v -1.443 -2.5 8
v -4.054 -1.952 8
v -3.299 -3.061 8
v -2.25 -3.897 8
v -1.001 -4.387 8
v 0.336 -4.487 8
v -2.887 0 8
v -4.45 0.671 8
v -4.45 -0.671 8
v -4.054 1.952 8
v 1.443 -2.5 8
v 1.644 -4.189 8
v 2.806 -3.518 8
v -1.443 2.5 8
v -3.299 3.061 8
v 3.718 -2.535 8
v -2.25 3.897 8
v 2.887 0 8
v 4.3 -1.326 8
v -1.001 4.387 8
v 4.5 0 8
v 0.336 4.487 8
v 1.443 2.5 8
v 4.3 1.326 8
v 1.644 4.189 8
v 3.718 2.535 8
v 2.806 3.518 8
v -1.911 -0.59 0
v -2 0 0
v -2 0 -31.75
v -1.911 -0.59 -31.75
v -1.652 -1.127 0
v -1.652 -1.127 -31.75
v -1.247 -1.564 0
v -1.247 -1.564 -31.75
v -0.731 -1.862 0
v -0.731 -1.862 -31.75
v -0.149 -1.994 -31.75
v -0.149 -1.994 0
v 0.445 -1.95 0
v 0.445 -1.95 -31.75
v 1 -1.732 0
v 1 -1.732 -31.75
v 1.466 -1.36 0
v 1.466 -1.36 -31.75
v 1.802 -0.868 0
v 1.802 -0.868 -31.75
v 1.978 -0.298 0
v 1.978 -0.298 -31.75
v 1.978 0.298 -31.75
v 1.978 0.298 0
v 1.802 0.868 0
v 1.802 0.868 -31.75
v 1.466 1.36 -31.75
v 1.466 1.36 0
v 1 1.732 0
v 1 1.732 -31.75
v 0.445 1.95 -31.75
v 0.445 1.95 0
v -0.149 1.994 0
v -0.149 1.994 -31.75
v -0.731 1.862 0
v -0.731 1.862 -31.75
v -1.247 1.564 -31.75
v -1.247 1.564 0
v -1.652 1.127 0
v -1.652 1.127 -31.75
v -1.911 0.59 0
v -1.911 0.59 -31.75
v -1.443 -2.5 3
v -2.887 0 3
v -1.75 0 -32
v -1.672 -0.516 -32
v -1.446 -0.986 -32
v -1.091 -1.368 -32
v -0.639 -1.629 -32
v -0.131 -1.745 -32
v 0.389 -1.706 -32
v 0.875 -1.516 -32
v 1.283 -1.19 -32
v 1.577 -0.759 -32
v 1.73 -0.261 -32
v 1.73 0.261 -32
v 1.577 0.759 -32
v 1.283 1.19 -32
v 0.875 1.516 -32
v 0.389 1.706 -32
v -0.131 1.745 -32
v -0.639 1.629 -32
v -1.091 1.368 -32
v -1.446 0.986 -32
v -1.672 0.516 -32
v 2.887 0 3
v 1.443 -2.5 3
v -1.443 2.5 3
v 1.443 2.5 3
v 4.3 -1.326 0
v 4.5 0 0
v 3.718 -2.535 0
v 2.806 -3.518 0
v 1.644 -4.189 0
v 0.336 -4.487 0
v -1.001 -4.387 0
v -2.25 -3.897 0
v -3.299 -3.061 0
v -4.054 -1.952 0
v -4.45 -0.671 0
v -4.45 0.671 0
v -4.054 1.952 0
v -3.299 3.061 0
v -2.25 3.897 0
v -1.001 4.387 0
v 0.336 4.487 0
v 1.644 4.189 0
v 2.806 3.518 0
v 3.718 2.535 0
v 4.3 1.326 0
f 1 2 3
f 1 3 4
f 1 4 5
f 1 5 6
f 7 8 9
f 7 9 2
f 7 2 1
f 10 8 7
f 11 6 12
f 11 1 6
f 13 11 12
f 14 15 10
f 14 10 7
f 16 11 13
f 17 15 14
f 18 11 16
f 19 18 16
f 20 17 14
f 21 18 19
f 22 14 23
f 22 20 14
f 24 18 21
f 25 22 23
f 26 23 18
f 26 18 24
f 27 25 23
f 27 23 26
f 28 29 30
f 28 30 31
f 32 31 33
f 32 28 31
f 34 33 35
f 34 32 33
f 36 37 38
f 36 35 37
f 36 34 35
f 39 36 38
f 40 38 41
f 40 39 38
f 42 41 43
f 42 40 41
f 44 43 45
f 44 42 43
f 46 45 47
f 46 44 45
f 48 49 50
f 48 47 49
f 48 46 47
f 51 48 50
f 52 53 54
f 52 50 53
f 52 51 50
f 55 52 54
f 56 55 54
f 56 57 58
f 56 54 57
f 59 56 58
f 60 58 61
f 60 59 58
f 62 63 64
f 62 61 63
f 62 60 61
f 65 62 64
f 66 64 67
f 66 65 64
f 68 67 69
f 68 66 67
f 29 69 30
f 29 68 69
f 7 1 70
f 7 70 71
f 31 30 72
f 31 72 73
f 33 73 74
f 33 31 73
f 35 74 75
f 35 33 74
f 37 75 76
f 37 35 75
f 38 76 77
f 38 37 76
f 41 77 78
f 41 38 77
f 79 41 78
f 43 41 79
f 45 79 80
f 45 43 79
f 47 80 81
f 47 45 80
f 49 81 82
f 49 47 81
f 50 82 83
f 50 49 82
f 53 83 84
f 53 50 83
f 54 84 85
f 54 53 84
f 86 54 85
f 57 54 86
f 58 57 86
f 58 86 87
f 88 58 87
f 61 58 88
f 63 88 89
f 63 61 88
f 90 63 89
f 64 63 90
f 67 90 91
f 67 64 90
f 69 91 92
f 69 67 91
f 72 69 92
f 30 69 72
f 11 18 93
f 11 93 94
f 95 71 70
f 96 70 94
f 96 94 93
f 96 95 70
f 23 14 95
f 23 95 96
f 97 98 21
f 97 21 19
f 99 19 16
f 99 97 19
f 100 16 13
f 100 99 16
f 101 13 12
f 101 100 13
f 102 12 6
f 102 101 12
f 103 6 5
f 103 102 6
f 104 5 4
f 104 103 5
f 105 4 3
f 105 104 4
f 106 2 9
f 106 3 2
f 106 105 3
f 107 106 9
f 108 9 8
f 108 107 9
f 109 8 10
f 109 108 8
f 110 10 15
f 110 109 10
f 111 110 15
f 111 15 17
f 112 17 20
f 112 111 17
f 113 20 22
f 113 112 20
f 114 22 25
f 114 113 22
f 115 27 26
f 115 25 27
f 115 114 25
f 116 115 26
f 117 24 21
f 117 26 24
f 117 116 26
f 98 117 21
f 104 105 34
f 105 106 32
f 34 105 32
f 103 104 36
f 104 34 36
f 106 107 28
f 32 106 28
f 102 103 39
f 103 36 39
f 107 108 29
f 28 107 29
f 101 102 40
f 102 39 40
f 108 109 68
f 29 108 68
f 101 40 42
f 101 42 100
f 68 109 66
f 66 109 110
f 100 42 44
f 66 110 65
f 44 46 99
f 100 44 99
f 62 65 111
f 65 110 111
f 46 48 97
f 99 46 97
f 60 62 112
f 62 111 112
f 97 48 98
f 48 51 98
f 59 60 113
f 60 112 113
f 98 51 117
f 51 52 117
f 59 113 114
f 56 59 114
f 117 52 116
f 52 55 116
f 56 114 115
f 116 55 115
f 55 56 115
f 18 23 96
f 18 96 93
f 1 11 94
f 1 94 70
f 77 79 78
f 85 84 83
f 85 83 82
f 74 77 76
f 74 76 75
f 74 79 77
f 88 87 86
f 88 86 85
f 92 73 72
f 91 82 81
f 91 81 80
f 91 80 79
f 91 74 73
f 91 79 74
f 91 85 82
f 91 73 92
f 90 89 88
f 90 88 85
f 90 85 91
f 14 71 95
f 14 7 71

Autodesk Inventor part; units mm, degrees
ref_plane "YZ Plane" through (0, 0, 0) normal (1, 0, 0) x (0, 1, 0)
ref_plane "XZ Plane" through (0, 0, 0) normal (0, 1, 0) x (-1, 0, 0)
ref_plane "XY Plane" through (0, 0, 0) normal (0, 0, 1) x (1, 0, 0)
sketch "草图1" plane through (0, 0, 0) normal (0, 0, 1) x (1, 0, 0)
  circle A0 centre (0, 0) radius 4.5
  dimension "d0" = 9
extrude "拉伸1" add sketch "草图1" along normal blind 8
sketch "草图2" plane through (0, 0, 0) normal (0, 0, -1) x (-1, 0, 0)
  circle A0 centre (0, 0) radius 2
  dimension "d3" = 4
extrude "拉伸2" add sketch "草图2" along normal blind 32
thread "螺纹1" size "M4x0.7" class "6g" standard "ANSI Metric M Profile" full length
chamfer "倒角1" distance 0.25 angle 45 1 edges at (2, 0, -32)
sketch "草图3" plane through (0, 0, 8) normal (0, 0, 1) x (1, 0, 0)
  line L0 (1.4434, -2.5) -> (-1.4434, -2.5)
  line L1 (-1.4434, -2.5) -> (-2.8868, 0)
  line L2 (-2.8868, 0) -> (-1.4434, 2.5)
  line L3 (-1.4434, 2.5) -> (1.4434, 2.5)
  line L4 (1.4434, 2.5) -> (2.8868, 0)
  line L5 (2.8868, 0) -> (1.4434, -2.5)
  line L6 (0, 0) -> (0, -0.6524)
  point P0 (0, 2.5)
  dimension "d11" = 0.6524
  dimension "d12" = 5
extrude "拉伸3" cut sketch "草图3" against normal blind 5
properties part number "载板滚柱挡板螺钉"
